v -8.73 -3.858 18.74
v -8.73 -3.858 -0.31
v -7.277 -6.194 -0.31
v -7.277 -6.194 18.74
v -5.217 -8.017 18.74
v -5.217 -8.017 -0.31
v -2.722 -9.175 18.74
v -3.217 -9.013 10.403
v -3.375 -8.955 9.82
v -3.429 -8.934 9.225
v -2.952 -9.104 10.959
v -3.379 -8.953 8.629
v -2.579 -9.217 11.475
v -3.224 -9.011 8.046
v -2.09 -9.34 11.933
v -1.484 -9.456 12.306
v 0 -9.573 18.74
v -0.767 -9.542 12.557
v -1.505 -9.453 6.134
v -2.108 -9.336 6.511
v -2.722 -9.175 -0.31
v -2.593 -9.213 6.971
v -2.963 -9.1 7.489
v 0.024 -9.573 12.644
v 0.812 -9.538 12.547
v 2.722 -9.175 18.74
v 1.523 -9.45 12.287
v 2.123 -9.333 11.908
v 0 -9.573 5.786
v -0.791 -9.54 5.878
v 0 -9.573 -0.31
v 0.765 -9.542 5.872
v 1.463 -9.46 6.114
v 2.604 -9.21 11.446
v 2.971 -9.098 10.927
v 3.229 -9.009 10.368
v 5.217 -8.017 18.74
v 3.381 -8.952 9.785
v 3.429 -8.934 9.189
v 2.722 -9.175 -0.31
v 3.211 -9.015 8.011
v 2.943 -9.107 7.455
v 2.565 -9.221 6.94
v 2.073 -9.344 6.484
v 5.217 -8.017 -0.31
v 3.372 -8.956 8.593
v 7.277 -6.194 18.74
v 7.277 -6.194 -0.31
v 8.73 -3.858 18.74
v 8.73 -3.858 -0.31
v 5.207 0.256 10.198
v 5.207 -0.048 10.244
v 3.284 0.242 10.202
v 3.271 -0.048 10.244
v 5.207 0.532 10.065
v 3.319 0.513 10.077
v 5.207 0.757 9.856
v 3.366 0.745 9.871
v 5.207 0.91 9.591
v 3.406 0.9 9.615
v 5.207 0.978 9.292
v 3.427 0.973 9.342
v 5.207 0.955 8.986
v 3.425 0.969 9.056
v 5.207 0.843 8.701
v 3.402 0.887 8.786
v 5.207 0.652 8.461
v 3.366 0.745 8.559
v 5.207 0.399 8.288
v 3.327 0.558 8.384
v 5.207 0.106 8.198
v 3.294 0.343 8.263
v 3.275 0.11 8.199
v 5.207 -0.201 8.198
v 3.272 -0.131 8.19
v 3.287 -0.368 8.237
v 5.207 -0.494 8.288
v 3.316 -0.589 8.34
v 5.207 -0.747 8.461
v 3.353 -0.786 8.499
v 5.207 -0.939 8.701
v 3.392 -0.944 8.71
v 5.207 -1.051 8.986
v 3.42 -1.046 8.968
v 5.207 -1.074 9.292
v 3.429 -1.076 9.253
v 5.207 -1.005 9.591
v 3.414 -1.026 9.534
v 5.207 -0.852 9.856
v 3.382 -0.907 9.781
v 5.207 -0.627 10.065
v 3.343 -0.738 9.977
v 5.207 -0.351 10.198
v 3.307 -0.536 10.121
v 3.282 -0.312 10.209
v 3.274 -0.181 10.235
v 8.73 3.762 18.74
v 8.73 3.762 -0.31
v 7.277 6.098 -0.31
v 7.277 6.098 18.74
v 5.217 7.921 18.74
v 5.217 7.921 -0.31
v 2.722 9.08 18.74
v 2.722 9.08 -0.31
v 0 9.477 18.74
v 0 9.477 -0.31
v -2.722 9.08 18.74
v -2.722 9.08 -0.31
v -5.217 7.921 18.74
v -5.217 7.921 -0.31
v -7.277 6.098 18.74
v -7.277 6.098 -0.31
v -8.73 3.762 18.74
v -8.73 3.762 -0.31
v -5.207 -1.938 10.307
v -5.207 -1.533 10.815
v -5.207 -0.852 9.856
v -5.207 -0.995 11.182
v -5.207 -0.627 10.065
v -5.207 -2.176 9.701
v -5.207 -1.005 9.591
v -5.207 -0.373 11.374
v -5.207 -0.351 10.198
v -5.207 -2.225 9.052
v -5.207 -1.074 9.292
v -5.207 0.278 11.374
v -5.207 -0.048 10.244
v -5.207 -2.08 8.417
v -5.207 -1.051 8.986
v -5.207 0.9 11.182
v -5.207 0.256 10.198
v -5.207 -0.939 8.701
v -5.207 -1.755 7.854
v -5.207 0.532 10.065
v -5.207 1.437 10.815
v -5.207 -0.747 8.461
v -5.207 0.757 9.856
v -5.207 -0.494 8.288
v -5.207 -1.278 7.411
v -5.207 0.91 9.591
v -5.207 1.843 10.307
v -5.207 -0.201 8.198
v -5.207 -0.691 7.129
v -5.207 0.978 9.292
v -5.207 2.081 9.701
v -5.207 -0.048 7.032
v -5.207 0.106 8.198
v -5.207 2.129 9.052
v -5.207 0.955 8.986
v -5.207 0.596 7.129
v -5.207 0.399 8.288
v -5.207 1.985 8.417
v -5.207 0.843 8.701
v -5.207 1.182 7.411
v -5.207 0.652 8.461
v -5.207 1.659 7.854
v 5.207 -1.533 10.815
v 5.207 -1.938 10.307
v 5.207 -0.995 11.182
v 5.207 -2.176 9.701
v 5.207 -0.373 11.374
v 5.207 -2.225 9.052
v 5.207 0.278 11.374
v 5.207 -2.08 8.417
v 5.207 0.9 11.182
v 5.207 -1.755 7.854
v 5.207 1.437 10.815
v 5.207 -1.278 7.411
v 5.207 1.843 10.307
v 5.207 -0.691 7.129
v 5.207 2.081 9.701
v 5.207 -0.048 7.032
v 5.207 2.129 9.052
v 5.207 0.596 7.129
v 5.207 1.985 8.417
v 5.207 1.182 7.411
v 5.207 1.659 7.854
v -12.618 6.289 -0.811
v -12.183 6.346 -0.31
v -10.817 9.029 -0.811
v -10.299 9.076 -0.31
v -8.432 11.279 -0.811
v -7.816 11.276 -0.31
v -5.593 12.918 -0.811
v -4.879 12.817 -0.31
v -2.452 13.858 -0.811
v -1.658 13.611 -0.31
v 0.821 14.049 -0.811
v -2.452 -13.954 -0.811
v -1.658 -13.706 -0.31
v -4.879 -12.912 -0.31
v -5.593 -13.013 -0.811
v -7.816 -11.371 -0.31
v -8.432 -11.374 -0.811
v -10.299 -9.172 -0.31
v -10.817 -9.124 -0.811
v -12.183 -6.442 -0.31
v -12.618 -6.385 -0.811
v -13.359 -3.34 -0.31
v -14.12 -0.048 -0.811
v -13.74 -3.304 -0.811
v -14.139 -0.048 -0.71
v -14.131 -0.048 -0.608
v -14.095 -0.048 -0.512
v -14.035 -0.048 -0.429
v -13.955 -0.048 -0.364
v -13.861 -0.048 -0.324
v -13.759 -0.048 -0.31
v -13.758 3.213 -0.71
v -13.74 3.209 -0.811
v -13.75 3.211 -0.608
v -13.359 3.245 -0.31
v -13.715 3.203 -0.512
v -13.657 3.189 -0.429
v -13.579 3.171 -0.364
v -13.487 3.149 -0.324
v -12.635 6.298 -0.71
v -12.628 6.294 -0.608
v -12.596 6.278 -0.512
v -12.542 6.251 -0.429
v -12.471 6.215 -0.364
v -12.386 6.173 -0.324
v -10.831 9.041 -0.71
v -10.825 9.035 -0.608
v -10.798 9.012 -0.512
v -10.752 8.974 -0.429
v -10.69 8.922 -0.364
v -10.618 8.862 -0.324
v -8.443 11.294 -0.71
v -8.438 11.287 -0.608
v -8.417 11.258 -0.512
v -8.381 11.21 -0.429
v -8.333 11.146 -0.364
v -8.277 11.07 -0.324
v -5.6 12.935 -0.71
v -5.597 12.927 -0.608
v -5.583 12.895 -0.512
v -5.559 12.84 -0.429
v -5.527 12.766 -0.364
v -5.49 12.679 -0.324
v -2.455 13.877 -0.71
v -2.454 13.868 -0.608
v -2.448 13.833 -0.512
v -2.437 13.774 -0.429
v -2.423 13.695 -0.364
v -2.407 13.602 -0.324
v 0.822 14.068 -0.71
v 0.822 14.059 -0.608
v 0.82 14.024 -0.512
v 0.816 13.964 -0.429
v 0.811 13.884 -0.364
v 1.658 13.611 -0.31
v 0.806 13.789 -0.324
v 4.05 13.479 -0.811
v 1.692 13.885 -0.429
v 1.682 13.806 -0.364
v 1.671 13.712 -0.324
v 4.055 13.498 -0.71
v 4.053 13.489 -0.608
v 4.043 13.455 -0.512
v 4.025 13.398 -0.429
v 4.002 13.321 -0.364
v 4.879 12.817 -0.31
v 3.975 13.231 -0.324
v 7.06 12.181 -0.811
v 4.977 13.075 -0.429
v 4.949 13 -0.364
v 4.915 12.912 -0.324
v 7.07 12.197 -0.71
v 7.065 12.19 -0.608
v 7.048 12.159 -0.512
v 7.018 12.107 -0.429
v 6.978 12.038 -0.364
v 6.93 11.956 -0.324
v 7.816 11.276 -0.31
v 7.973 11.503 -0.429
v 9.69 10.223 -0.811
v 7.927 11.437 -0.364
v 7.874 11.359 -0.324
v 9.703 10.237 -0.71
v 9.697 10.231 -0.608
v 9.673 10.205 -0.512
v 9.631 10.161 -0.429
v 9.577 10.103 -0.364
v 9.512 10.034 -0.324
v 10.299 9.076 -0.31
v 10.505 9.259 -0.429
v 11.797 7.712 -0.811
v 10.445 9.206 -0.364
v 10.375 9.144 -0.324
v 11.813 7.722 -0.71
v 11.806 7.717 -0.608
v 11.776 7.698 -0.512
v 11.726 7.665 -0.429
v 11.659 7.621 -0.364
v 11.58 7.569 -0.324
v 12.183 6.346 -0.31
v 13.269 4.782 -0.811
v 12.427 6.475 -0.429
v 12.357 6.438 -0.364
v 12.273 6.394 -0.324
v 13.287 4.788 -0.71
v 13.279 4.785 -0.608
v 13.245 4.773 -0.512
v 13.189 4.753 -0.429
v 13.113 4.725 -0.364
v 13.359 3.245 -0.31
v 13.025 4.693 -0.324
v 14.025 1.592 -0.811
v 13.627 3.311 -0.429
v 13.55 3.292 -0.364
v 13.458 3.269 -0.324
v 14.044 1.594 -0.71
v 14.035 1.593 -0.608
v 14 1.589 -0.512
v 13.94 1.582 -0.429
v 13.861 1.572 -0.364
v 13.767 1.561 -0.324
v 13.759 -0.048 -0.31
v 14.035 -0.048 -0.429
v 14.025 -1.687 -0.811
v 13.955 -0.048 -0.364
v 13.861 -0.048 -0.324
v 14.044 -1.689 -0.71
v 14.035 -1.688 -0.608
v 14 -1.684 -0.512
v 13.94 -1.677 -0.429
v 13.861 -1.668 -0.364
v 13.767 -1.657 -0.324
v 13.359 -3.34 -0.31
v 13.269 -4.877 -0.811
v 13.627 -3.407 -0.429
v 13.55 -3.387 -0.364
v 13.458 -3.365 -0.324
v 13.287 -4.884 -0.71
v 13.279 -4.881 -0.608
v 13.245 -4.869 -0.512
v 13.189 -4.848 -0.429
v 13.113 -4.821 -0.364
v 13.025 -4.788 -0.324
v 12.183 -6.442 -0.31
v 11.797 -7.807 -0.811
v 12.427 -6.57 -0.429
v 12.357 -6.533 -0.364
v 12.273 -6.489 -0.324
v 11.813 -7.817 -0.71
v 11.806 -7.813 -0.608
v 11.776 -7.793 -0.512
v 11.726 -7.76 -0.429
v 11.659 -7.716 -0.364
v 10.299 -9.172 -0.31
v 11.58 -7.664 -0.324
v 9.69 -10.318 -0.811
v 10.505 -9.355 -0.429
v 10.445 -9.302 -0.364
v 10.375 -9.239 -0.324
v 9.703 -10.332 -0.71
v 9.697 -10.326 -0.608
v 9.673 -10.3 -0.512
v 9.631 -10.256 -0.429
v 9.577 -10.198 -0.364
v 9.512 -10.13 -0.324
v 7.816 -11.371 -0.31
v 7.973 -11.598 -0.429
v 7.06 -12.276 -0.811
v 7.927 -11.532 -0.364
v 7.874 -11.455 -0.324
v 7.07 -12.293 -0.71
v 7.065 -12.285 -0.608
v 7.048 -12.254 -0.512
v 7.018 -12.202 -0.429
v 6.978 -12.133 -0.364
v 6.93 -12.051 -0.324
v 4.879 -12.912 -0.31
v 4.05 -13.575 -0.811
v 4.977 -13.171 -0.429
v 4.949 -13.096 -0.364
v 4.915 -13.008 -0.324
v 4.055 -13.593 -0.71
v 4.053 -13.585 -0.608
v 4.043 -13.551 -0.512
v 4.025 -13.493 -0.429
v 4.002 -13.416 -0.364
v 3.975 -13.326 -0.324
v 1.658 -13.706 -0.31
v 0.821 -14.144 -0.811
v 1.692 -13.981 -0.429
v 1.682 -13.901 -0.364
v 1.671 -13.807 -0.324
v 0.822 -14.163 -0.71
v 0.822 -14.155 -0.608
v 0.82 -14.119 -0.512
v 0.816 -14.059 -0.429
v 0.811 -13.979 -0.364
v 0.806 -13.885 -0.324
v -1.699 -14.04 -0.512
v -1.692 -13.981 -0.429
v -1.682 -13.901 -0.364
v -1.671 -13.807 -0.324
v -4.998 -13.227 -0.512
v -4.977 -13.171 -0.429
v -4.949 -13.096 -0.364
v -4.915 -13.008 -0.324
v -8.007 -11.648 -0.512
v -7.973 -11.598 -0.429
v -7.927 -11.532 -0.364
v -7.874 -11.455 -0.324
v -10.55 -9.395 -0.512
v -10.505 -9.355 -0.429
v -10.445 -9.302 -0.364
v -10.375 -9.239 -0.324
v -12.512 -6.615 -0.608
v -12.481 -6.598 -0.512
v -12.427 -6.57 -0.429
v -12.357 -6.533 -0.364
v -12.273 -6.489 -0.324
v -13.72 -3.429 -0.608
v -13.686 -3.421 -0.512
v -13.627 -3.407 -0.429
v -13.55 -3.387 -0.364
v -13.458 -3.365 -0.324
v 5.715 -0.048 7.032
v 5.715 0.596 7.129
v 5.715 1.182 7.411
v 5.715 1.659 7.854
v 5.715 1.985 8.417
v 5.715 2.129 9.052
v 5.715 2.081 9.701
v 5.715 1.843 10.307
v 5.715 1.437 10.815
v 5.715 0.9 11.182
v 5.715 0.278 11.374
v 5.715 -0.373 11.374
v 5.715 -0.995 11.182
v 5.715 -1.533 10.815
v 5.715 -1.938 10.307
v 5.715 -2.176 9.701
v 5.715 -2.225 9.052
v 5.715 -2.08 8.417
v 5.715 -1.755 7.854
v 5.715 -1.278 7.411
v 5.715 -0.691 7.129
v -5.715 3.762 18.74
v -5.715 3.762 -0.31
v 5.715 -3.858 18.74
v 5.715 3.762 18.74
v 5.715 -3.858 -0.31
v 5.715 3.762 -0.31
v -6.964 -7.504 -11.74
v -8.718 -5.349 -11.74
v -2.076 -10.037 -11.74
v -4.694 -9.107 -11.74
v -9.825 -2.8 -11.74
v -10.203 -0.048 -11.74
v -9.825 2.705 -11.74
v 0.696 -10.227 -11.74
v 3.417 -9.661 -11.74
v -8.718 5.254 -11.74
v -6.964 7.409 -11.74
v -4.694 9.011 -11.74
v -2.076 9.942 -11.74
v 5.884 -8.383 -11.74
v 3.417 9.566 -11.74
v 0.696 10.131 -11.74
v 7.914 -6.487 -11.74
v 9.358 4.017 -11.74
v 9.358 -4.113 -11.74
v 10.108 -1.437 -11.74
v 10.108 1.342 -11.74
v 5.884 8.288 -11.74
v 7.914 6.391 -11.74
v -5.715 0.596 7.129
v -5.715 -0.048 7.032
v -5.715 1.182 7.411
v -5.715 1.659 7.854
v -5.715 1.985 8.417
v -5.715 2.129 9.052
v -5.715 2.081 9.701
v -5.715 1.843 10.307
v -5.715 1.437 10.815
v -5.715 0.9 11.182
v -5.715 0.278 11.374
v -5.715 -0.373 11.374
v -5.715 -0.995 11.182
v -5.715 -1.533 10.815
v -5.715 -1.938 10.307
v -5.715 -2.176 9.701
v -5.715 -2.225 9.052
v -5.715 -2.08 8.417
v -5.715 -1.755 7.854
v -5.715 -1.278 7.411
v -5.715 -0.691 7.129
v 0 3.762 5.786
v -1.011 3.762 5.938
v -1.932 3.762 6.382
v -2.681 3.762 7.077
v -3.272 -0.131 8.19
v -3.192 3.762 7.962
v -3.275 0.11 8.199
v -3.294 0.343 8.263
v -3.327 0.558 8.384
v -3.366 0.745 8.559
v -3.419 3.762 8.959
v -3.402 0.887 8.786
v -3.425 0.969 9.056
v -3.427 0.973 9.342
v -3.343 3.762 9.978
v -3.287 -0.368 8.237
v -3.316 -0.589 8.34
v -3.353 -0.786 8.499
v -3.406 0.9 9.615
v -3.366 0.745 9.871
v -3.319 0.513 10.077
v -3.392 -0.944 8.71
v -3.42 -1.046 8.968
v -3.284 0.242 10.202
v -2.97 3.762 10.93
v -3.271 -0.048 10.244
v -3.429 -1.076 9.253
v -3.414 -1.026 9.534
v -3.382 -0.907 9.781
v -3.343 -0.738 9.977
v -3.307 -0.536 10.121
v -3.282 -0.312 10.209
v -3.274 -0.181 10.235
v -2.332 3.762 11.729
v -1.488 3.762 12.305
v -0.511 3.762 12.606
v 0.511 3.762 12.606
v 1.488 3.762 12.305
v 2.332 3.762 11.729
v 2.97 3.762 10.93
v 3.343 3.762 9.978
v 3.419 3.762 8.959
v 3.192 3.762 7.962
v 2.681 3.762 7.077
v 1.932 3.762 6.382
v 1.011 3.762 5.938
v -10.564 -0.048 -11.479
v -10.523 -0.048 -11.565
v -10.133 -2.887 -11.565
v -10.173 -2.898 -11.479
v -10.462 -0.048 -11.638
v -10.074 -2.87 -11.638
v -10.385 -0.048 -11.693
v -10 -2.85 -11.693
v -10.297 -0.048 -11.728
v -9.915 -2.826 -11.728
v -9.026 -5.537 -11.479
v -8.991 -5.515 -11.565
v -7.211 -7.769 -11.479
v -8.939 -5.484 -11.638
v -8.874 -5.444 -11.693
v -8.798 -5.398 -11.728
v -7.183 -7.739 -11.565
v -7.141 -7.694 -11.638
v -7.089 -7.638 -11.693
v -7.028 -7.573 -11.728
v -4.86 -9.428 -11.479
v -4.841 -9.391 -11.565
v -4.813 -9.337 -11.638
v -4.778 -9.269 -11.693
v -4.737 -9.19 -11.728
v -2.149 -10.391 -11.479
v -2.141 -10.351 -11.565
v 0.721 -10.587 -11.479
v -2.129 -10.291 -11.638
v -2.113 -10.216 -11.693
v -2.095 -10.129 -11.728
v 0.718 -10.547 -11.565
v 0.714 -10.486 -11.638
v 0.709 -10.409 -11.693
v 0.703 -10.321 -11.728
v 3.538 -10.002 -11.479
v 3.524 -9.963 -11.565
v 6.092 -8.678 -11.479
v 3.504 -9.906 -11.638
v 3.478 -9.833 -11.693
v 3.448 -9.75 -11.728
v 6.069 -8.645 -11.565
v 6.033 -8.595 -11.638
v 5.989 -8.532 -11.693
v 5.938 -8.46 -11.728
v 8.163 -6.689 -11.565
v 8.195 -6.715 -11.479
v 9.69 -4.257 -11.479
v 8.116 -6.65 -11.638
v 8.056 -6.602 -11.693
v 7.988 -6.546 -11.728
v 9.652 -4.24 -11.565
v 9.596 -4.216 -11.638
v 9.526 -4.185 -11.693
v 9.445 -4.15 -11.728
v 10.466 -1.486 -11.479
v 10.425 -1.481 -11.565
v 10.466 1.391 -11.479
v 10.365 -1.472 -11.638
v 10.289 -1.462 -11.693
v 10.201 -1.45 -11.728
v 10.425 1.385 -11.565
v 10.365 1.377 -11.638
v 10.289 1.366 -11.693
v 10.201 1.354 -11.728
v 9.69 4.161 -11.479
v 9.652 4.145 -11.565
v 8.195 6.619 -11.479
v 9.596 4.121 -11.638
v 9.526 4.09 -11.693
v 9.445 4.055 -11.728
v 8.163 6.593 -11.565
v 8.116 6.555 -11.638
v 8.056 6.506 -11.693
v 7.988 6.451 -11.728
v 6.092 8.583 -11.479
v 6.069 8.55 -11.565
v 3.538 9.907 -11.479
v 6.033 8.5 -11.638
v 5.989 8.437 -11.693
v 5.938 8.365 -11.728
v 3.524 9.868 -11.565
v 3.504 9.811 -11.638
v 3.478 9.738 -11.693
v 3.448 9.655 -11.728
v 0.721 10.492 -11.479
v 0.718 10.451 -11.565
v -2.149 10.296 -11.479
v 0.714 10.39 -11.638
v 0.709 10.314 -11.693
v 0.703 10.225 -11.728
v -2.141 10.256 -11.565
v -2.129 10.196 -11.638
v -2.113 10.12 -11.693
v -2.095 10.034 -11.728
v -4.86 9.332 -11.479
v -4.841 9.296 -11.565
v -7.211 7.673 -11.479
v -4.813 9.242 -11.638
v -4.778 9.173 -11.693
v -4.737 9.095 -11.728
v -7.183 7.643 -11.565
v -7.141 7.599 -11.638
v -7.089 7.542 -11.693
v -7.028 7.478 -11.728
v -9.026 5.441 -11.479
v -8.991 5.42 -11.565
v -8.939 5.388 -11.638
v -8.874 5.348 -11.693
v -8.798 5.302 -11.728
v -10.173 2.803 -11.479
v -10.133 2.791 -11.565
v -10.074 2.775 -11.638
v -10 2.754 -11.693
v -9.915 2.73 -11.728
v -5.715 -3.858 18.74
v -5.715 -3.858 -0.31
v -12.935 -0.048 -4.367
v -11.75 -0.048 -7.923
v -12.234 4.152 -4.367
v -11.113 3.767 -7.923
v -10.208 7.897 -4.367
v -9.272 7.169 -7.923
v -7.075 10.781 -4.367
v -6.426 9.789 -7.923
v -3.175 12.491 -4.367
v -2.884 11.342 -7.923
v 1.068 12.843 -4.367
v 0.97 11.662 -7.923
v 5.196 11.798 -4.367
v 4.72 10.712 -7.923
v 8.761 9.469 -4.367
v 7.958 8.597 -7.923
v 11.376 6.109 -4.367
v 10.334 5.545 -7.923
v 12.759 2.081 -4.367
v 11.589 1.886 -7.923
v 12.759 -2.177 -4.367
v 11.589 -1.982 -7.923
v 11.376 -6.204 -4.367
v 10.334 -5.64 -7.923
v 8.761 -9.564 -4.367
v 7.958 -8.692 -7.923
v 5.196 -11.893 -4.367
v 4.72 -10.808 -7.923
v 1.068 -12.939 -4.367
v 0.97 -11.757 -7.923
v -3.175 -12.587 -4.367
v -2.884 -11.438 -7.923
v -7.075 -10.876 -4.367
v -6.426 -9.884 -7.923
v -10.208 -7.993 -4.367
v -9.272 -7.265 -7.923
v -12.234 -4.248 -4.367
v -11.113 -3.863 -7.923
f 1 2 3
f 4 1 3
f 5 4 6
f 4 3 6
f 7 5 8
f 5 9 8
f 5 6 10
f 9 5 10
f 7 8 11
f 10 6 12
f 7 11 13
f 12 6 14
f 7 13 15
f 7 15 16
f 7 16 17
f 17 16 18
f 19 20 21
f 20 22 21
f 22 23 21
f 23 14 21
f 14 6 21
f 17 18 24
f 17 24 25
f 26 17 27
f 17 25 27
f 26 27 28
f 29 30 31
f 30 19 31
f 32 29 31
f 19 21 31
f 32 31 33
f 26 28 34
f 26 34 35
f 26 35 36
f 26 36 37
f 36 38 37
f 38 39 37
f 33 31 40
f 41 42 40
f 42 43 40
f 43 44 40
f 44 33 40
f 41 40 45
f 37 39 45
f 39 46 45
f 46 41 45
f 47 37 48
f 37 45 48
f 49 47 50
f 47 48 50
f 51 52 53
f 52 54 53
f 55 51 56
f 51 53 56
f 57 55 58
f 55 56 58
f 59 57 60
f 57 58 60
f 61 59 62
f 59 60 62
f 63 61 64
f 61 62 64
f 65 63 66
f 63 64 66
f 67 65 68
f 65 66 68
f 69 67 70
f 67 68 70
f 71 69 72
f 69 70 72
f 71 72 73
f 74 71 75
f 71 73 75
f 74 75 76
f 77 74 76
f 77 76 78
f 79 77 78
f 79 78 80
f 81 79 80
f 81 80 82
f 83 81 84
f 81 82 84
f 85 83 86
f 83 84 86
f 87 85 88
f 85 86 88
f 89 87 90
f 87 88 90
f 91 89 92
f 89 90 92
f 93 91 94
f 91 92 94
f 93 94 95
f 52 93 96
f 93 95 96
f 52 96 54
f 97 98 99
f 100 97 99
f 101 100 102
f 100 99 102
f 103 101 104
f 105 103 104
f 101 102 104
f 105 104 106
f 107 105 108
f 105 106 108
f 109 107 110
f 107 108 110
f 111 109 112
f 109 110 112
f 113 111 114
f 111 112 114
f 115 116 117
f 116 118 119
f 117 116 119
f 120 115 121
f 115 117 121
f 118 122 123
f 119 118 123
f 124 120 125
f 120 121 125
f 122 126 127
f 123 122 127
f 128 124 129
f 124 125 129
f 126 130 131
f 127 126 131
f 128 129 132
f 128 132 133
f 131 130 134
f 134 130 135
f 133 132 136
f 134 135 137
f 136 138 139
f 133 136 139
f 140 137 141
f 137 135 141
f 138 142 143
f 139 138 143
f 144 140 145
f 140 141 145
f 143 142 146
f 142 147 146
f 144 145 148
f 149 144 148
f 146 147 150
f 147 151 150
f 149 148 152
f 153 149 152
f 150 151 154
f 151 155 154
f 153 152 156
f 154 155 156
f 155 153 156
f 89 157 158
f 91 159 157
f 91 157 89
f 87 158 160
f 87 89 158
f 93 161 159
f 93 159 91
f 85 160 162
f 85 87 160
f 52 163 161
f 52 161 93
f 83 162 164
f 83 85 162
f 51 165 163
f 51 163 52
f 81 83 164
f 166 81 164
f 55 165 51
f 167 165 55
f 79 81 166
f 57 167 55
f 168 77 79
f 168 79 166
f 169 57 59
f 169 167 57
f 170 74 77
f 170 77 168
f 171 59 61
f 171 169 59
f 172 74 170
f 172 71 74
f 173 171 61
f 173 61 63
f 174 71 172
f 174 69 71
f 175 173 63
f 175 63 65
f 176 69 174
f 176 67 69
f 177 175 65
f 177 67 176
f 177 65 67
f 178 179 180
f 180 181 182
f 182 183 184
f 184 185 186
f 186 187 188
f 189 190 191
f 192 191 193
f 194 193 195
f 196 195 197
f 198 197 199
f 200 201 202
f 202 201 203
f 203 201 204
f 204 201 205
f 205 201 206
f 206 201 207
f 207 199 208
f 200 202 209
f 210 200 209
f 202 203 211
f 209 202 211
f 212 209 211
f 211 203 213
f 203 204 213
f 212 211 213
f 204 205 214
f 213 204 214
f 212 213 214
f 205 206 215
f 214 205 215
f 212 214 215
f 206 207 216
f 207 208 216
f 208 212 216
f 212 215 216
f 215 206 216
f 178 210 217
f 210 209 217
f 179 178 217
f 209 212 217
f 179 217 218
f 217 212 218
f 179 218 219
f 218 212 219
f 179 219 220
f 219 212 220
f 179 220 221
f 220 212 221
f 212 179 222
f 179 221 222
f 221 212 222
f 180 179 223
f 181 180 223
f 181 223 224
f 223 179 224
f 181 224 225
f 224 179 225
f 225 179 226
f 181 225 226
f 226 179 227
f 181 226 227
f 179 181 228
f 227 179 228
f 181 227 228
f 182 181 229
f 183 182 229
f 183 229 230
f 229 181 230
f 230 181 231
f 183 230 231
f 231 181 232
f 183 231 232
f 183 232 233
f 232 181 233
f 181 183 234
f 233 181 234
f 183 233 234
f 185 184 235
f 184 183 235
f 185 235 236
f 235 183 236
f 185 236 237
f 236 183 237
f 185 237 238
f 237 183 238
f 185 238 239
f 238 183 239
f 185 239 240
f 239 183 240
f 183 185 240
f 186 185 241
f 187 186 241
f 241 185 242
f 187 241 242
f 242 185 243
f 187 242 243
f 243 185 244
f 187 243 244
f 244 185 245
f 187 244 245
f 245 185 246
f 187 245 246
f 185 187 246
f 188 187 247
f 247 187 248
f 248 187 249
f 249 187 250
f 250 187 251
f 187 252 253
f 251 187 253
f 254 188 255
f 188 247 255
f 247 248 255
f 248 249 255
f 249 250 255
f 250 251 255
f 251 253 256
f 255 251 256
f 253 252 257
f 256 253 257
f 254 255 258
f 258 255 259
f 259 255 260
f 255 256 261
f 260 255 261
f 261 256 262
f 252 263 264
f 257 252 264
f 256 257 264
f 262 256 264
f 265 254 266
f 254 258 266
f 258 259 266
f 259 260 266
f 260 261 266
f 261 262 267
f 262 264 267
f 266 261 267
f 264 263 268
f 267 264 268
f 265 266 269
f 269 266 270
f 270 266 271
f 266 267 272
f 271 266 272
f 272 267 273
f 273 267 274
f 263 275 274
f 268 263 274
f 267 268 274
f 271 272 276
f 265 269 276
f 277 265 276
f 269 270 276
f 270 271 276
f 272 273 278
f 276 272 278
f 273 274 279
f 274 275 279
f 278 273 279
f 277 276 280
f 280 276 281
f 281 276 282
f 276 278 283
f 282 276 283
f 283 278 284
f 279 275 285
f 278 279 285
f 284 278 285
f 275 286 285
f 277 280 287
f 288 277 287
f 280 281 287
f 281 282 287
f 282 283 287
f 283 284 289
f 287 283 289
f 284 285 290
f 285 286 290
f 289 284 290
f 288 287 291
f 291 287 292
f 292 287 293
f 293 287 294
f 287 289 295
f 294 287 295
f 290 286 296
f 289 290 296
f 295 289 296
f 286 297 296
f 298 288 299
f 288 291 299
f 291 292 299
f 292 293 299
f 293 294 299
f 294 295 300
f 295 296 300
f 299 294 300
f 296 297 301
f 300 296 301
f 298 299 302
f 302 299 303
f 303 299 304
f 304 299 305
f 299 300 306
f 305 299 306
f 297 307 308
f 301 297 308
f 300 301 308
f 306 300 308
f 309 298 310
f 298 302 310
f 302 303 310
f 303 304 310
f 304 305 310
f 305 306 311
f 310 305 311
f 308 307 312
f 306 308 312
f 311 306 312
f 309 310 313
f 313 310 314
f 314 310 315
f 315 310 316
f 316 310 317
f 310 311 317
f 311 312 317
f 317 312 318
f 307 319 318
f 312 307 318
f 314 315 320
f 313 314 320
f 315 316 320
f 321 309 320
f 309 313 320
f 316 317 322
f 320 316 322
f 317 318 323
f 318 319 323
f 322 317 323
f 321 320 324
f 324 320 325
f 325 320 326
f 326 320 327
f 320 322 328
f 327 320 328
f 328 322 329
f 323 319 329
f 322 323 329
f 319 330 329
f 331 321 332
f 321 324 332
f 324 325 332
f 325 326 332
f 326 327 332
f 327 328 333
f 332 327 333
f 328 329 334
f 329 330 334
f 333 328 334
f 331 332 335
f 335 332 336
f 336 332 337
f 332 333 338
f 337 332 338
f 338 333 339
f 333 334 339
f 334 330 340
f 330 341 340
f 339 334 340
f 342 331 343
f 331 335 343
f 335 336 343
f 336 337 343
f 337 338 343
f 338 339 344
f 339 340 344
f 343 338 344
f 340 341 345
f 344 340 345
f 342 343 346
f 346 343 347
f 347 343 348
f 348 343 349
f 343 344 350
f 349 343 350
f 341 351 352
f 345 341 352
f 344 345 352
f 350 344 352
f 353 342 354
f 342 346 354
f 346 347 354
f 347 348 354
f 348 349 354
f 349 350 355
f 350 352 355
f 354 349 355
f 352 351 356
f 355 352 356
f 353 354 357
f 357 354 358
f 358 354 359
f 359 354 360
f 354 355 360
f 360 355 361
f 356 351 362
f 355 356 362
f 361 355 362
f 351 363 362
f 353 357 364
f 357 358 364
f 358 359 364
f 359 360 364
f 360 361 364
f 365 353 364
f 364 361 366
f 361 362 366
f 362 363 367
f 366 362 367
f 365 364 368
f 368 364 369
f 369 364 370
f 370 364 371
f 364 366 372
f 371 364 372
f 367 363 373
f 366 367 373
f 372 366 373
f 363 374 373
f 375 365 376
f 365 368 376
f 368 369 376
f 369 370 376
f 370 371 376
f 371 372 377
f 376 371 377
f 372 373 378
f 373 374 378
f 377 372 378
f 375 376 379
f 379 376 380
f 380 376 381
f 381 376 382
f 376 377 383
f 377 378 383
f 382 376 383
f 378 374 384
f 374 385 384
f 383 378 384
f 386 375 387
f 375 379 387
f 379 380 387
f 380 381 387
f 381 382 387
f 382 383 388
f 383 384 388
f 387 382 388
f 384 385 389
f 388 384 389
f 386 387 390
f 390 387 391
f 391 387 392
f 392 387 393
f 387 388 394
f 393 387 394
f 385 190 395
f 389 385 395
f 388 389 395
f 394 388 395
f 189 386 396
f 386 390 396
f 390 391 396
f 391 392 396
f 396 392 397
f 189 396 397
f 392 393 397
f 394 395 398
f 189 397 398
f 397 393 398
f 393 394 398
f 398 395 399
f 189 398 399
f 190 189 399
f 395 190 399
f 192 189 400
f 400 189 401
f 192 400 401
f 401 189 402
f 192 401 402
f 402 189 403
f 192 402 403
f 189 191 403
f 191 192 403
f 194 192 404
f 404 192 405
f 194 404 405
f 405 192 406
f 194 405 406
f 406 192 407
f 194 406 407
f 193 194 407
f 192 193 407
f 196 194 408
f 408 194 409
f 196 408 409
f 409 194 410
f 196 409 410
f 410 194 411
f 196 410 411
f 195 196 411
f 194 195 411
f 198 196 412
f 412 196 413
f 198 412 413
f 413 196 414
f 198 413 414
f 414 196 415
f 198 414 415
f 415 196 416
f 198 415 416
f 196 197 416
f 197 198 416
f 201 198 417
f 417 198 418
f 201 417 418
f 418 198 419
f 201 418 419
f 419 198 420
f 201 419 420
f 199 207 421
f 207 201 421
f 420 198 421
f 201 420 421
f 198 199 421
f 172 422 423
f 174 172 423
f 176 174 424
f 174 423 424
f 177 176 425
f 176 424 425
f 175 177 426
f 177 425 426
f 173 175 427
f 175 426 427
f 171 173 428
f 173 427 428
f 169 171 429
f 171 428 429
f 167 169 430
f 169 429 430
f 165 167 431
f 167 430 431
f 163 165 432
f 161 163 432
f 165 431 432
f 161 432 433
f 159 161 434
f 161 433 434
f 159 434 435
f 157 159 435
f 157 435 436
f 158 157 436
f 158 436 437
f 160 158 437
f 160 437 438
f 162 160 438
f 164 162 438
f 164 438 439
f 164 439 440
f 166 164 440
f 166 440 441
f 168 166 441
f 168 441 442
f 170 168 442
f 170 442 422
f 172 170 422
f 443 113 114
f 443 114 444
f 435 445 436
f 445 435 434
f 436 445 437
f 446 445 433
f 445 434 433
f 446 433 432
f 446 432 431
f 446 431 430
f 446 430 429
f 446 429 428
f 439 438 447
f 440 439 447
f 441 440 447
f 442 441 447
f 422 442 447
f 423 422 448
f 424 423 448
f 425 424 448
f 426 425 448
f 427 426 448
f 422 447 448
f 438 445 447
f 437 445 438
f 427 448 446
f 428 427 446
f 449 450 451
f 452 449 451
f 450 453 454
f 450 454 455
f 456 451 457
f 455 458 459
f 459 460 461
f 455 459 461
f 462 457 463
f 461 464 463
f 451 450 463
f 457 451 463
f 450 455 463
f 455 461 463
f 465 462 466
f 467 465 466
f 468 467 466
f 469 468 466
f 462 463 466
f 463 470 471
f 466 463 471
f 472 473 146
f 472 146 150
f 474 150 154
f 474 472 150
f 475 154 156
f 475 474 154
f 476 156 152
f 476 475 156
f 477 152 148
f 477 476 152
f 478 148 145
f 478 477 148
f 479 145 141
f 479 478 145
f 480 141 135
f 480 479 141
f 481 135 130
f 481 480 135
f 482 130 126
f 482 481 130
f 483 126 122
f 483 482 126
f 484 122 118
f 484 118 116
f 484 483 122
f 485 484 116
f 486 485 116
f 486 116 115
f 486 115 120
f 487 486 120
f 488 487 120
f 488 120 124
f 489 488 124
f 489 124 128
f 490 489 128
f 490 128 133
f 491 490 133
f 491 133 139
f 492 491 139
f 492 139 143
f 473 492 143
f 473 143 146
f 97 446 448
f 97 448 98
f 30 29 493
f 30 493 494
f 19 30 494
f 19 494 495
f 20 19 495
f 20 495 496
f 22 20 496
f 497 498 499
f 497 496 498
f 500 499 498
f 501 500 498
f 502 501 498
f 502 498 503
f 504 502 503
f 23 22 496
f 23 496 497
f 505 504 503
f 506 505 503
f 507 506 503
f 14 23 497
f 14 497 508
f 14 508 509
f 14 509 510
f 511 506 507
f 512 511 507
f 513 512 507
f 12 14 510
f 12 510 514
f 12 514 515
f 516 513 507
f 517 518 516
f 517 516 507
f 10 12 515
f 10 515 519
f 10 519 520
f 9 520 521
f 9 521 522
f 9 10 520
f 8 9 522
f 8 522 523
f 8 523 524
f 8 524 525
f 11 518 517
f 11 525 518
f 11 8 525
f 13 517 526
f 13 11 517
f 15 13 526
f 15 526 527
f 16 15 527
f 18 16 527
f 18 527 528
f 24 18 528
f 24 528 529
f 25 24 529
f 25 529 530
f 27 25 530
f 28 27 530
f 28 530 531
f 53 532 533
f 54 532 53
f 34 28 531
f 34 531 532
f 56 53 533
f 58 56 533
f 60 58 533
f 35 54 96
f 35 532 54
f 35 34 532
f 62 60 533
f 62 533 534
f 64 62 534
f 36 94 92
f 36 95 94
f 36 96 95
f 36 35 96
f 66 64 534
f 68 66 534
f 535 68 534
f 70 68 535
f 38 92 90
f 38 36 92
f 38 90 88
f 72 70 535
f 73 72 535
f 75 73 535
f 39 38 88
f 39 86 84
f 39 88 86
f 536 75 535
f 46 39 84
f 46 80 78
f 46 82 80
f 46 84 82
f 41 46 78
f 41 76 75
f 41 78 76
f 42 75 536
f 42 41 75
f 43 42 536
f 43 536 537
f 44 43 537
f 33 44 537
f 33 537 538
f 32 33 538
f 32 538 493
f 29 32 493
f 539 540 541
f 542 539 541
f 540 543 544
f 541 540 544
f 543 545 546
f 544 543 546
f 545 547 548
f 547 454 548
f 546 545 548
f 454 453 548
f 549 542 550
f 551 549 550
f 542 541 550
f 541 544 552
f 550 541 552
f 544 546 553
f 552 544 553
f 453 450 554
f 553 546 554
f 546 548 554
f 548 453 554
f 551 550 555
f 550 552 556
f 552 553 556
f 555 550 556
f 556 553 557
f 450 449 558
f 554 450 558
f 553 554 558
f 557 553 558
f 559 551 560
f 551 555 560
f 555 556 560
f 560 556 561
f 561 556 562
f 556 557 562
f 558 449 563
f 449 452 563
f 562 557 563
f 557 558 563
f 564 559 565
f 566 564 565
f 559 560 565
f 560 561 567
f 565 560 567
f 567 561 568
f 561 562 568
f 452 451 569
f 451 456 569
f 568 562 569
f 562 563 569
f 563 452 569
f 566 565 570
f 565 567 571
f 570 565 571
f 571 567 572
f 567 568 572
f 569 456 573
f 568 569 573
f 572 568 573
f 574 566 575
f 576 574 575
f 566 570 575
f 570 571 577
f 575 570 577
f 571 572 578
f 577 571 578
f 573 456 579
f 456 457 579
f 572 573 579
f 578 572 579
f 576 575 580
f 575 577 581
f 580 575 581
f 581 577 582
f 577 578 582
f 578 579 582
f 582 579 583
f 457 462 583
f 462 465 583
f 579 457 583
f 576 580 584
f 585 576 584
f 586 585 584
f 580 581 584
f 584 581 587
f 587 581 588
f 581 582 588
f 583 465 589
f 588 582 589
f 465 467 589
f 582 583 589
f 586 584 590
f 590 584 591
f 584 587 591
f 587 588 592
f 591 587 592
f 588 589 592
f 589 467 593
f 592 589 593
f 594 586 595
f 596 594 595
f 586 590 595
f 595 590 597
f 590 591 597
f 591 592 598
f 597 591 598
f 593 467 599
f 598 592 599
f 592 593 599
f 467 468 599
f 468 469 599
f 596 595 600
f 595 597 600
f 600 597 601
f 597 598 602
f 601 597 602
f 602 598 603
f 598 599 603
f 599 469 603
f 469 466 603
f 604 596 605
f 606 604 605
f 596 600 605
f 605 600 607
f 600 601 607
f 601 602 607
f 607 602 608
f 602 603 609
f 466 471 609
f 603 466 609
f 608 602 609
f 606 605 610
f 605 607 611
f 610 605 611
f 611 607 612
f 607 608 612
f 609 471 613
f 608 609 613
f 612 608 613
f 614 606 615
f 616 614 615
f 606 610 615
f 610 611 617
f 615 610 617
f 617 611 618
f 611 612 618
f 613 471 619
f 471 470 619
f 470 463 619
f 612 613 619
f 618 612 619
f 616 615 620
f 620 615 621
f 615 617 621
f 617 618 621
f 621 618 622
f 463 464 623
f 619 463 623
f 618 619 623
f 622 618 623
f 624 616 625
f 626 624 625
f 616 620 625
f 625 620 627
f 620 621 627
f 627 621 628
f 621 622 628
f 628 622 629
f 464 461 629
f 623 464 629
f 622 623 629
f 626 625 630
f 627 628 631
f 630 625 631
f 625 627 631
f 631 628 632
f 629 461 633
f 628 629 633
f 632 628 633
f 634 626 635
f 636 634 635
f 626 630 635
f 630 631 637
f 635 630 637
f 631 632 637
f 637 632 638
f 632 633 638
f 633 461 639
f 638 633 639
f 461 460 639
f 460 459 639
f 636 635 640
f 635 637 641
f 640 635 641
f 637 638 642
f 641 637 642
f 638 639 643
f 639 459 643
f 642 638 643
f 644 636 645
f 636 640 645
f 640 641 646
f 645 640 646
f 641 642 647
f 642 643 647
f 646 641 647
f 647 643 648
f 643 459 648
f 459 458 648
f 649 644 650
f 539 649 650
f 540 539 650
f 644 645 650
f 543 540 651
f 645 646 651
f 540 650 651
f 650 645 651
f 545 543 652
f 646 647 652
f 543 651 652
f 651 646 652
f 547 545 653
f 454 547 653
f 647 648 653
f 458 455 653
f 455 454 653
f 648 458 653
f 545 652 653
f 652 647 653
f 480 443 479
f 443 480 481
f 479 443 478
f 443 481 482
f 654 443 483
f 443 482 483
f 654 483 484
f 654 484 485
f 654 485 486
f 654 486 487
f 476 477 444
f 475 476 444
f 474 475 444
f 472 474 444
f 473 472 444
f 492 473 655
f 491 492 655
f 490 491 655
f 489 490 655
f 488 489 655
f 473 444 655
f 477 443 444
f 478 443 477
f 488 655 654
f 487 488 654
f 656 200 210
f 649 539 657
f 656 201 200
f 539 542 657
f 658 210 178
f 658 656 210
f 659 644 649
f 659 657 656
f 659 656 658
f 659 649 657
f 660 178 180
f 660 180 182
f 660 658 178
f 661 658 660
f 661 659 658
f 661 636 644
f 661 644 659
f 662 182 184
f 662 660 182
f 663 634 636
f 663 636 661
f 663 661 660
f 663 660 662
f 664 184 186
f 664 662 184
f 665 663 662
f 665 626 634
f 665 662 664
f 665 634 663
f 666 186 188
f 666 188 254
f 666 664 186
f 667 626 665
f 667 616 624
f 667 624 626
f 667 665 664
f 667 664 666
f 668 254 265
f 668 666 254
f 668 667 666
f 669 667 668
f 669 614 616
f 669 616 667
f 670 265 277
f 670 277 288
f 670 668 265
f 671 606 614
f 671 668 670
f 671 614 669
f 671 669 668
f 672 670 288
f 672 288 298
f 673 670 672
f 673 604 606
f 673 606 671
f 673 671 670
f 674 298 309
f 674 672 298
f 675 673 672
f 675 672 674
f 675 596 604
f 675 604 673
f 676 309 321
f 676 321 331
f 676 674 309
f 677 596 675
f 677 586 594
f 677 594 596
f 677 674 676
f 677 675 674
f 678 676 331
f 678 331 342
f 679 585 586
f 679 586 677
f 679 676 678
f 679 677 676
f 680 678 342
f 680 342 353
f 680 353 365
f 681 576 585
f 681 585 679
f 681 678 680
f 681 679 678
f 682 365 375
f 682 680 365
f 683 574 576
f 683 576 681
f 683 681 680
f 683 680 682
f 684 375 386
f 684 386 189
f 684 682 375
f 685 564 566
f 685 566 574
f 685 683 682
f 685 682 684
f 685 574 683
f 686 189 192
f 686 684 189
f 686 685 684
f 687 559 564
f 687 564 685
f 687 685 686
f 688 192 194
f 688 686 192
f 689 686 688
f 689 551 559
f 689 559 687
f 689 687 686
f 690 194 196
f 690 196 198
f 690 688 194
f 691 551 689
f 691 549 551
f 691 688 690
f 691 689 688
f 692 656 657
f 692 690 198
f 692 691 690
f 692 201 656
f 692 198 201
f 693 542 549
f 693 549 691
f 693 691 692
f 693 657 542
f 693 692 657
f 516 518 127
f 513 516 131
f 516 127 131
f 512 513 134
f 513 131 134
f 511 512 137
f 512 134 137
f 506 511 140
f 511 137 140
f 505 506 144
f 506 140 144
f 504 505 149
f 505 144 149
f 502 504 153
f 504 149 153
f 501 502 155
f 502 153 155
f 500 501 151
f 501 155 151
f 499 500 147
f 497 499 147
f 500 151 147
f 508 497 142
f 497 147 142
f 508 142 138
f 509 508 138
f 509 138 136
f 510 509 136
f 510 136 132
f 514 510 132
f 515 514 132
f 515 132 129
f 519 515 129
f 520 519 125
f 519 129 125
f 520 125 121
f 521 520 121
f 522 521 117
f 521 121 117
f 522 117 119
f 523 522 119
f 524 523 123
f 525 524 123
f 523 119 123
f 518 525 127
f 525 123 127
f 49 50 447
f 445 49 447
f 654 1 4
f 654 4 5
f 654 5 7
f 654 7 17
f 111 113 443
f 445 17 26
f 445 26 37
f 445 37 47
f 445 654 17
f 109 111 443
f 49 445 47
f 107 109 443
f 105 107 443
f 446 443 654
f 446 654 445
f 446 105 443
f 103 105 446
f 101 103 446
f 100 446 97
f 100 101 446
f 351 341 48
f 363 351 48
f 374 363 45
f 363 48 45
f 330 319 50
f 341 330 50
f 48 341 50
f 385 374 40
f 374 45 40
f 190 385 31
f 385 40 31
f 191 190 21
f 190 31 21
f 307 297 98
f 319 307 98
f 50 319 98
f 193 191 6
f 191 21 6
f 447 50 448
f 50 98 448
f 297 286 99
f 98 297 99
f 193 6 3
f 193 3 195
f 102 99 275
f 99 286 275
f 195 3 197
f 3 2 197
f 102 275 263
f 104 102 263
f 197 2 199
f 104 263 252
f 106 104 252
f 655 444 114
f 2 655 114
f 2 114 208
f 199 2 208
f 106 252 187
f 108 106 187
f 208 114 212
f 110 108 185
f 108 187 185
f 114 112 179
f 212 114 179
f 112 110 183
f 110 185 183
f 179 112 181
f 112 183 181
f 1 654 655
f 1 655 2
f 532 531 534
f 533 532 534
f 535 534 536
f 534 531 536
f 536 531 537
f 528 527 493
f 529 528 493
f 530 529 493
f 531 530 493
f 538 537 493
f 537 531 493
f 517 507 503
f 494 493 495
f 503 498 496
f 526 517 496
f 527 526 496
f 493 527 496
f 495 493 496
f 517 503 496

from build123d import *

# Parameters (mm, degrees)
BOSS_EXTRUDE1_DEPTH                             = 12.7
SKETCH2_R                                       = 9.525
SKETCH3_R                                       = 6.985
FILLET1_R                                       = 0.254
CUT_EXTRUDE1_DEPTH                              = 2.54
CUT_EXTRUDE1_DEPTH_BACK                         = 19.412260753
SKETCH4_R                                       = 2.286
SCALE1_SCALE                                    = 1.5
CBORE_FOR_1_PAN_HEAD_MACHINE_SCREW2_D           = 2.0574
CBORE_FOR_1_PAN_HEAD_MACHINE_SCREW2_CBORE_D     = 4.36626
CBORE_FOR_1_PAN_HEAD_MACHINE_SCREW2_CBORE_DEPTH = 0.508


with BuildPart() as part:
    # Sketch1 → Boss-Extrude1 (new body)
    with BuildSketch(Plane.XY):
        with BuildLine():
            ThreePointArc((5.819871133, 2.54), (0, 6.35), (-5.819871133, 2.54))
            Line((-5.819871133, 2.54), (-3.81, 2.54))
            Line((-3.81, 2.54), (-3.81, -2.54))
            Line((-3.81, -2.54), (-5.819871133, -2.54))
            ThreePointArc((-5.819871133, -2.54), (0, -6.35), (5.819871133, -2.54))
            Line((5.819871133, -2.54), (3.81, -2.54))
            Line((3.81, -2.54), (3.81, 2.54))
            Line((3.81, 2.54), (5.819871133, 2.54))
        make_face()
    extrude(amount=BOSS_EXTRUDE1_DEPTH)

    # Sketch2 → Loft1 section 0
    with BuildSketch(Plane(origin=(0, 0, 0), x_dir=(-1, 0, 0), z_dir=(0, 0, -1))):
        Circle(SKETCH2_R)
    # Sketch3 → Loft1 section 1
    with BuildSketch(Plane.XY.offset(-7.62)):
        Circle(SKETCH3_R)
    loft()

    # Fillet1
    fillet1_edges = [part.edges().sort_by_distance(p)[0] for p in [
        (9.525, 0, 0),
        (6.985, 0, -7.62),
    ]]
    fillet(fillet1_edges, radius=FILLET1_R)

    # Sketch4 → Cut-Extrude1 (cut, two sides: drawn at the far end of the back side and taken through both)
    with BuildSketch(Plane(origin=(0, 0, 0), x_dir=(1, 0, 0), z_dir=(0, 1, 0)).offset(-CUT_EXTRUDE1_DEPTH_BACK)):
        with Locations(Location((0, -6.35, 0), (0, 0, 90))):
            Circle(SKETCH4_R)
    extrude(amount=CUT_EXTRUDE1_DEPTH + CUT_EXTRUDE1_DEPTH_BACK, mode=Mode.SUBTRACT)


with BuildPart() as part_1:
    # Scale1: scaled about (5.44e-07, 0.095418274, 0.619819033)
    add(part.part.scale(SCALE1_SCALE).moved(Location((-2.72e-07, -0.047709137, -0.309909516))))

    # CBORE for #1 Pan Head Machine Screw2 (through all)
    with Locations(Plane(origin=(5.715002511, 0, 0), x_dir=(0, 0, -1), z_dir=(1, 0, 0))):
        with Locations((-9.2150808, -0.047706209)):
            cbore_for_1_pan_head_machine_screw2 = CounterBoreHole(CBORE_FOR_1_PAN_HEAD_MACHINE_SCREW2_D / 2, CBORE_FOR_1_PAN_HEAD_MACHINE_SCREW2_CBORE_D / 2, CBORE_FOR_1_PAN_HEAD_MACHINE_SCREW2_CBORE_DEPTH)

    # Mirror1: CBORE for #1 Pan Head Machine Screw2 across plane
    add(cbore_for_1_pan_head_machine_screw2.mirror(Plane(origin=(0, 0, 0), x_dir=(0, 0, 1), z_dir=(1, 0, 0))), mode=Mode.SUBTRACT)


solid = part_1.part
